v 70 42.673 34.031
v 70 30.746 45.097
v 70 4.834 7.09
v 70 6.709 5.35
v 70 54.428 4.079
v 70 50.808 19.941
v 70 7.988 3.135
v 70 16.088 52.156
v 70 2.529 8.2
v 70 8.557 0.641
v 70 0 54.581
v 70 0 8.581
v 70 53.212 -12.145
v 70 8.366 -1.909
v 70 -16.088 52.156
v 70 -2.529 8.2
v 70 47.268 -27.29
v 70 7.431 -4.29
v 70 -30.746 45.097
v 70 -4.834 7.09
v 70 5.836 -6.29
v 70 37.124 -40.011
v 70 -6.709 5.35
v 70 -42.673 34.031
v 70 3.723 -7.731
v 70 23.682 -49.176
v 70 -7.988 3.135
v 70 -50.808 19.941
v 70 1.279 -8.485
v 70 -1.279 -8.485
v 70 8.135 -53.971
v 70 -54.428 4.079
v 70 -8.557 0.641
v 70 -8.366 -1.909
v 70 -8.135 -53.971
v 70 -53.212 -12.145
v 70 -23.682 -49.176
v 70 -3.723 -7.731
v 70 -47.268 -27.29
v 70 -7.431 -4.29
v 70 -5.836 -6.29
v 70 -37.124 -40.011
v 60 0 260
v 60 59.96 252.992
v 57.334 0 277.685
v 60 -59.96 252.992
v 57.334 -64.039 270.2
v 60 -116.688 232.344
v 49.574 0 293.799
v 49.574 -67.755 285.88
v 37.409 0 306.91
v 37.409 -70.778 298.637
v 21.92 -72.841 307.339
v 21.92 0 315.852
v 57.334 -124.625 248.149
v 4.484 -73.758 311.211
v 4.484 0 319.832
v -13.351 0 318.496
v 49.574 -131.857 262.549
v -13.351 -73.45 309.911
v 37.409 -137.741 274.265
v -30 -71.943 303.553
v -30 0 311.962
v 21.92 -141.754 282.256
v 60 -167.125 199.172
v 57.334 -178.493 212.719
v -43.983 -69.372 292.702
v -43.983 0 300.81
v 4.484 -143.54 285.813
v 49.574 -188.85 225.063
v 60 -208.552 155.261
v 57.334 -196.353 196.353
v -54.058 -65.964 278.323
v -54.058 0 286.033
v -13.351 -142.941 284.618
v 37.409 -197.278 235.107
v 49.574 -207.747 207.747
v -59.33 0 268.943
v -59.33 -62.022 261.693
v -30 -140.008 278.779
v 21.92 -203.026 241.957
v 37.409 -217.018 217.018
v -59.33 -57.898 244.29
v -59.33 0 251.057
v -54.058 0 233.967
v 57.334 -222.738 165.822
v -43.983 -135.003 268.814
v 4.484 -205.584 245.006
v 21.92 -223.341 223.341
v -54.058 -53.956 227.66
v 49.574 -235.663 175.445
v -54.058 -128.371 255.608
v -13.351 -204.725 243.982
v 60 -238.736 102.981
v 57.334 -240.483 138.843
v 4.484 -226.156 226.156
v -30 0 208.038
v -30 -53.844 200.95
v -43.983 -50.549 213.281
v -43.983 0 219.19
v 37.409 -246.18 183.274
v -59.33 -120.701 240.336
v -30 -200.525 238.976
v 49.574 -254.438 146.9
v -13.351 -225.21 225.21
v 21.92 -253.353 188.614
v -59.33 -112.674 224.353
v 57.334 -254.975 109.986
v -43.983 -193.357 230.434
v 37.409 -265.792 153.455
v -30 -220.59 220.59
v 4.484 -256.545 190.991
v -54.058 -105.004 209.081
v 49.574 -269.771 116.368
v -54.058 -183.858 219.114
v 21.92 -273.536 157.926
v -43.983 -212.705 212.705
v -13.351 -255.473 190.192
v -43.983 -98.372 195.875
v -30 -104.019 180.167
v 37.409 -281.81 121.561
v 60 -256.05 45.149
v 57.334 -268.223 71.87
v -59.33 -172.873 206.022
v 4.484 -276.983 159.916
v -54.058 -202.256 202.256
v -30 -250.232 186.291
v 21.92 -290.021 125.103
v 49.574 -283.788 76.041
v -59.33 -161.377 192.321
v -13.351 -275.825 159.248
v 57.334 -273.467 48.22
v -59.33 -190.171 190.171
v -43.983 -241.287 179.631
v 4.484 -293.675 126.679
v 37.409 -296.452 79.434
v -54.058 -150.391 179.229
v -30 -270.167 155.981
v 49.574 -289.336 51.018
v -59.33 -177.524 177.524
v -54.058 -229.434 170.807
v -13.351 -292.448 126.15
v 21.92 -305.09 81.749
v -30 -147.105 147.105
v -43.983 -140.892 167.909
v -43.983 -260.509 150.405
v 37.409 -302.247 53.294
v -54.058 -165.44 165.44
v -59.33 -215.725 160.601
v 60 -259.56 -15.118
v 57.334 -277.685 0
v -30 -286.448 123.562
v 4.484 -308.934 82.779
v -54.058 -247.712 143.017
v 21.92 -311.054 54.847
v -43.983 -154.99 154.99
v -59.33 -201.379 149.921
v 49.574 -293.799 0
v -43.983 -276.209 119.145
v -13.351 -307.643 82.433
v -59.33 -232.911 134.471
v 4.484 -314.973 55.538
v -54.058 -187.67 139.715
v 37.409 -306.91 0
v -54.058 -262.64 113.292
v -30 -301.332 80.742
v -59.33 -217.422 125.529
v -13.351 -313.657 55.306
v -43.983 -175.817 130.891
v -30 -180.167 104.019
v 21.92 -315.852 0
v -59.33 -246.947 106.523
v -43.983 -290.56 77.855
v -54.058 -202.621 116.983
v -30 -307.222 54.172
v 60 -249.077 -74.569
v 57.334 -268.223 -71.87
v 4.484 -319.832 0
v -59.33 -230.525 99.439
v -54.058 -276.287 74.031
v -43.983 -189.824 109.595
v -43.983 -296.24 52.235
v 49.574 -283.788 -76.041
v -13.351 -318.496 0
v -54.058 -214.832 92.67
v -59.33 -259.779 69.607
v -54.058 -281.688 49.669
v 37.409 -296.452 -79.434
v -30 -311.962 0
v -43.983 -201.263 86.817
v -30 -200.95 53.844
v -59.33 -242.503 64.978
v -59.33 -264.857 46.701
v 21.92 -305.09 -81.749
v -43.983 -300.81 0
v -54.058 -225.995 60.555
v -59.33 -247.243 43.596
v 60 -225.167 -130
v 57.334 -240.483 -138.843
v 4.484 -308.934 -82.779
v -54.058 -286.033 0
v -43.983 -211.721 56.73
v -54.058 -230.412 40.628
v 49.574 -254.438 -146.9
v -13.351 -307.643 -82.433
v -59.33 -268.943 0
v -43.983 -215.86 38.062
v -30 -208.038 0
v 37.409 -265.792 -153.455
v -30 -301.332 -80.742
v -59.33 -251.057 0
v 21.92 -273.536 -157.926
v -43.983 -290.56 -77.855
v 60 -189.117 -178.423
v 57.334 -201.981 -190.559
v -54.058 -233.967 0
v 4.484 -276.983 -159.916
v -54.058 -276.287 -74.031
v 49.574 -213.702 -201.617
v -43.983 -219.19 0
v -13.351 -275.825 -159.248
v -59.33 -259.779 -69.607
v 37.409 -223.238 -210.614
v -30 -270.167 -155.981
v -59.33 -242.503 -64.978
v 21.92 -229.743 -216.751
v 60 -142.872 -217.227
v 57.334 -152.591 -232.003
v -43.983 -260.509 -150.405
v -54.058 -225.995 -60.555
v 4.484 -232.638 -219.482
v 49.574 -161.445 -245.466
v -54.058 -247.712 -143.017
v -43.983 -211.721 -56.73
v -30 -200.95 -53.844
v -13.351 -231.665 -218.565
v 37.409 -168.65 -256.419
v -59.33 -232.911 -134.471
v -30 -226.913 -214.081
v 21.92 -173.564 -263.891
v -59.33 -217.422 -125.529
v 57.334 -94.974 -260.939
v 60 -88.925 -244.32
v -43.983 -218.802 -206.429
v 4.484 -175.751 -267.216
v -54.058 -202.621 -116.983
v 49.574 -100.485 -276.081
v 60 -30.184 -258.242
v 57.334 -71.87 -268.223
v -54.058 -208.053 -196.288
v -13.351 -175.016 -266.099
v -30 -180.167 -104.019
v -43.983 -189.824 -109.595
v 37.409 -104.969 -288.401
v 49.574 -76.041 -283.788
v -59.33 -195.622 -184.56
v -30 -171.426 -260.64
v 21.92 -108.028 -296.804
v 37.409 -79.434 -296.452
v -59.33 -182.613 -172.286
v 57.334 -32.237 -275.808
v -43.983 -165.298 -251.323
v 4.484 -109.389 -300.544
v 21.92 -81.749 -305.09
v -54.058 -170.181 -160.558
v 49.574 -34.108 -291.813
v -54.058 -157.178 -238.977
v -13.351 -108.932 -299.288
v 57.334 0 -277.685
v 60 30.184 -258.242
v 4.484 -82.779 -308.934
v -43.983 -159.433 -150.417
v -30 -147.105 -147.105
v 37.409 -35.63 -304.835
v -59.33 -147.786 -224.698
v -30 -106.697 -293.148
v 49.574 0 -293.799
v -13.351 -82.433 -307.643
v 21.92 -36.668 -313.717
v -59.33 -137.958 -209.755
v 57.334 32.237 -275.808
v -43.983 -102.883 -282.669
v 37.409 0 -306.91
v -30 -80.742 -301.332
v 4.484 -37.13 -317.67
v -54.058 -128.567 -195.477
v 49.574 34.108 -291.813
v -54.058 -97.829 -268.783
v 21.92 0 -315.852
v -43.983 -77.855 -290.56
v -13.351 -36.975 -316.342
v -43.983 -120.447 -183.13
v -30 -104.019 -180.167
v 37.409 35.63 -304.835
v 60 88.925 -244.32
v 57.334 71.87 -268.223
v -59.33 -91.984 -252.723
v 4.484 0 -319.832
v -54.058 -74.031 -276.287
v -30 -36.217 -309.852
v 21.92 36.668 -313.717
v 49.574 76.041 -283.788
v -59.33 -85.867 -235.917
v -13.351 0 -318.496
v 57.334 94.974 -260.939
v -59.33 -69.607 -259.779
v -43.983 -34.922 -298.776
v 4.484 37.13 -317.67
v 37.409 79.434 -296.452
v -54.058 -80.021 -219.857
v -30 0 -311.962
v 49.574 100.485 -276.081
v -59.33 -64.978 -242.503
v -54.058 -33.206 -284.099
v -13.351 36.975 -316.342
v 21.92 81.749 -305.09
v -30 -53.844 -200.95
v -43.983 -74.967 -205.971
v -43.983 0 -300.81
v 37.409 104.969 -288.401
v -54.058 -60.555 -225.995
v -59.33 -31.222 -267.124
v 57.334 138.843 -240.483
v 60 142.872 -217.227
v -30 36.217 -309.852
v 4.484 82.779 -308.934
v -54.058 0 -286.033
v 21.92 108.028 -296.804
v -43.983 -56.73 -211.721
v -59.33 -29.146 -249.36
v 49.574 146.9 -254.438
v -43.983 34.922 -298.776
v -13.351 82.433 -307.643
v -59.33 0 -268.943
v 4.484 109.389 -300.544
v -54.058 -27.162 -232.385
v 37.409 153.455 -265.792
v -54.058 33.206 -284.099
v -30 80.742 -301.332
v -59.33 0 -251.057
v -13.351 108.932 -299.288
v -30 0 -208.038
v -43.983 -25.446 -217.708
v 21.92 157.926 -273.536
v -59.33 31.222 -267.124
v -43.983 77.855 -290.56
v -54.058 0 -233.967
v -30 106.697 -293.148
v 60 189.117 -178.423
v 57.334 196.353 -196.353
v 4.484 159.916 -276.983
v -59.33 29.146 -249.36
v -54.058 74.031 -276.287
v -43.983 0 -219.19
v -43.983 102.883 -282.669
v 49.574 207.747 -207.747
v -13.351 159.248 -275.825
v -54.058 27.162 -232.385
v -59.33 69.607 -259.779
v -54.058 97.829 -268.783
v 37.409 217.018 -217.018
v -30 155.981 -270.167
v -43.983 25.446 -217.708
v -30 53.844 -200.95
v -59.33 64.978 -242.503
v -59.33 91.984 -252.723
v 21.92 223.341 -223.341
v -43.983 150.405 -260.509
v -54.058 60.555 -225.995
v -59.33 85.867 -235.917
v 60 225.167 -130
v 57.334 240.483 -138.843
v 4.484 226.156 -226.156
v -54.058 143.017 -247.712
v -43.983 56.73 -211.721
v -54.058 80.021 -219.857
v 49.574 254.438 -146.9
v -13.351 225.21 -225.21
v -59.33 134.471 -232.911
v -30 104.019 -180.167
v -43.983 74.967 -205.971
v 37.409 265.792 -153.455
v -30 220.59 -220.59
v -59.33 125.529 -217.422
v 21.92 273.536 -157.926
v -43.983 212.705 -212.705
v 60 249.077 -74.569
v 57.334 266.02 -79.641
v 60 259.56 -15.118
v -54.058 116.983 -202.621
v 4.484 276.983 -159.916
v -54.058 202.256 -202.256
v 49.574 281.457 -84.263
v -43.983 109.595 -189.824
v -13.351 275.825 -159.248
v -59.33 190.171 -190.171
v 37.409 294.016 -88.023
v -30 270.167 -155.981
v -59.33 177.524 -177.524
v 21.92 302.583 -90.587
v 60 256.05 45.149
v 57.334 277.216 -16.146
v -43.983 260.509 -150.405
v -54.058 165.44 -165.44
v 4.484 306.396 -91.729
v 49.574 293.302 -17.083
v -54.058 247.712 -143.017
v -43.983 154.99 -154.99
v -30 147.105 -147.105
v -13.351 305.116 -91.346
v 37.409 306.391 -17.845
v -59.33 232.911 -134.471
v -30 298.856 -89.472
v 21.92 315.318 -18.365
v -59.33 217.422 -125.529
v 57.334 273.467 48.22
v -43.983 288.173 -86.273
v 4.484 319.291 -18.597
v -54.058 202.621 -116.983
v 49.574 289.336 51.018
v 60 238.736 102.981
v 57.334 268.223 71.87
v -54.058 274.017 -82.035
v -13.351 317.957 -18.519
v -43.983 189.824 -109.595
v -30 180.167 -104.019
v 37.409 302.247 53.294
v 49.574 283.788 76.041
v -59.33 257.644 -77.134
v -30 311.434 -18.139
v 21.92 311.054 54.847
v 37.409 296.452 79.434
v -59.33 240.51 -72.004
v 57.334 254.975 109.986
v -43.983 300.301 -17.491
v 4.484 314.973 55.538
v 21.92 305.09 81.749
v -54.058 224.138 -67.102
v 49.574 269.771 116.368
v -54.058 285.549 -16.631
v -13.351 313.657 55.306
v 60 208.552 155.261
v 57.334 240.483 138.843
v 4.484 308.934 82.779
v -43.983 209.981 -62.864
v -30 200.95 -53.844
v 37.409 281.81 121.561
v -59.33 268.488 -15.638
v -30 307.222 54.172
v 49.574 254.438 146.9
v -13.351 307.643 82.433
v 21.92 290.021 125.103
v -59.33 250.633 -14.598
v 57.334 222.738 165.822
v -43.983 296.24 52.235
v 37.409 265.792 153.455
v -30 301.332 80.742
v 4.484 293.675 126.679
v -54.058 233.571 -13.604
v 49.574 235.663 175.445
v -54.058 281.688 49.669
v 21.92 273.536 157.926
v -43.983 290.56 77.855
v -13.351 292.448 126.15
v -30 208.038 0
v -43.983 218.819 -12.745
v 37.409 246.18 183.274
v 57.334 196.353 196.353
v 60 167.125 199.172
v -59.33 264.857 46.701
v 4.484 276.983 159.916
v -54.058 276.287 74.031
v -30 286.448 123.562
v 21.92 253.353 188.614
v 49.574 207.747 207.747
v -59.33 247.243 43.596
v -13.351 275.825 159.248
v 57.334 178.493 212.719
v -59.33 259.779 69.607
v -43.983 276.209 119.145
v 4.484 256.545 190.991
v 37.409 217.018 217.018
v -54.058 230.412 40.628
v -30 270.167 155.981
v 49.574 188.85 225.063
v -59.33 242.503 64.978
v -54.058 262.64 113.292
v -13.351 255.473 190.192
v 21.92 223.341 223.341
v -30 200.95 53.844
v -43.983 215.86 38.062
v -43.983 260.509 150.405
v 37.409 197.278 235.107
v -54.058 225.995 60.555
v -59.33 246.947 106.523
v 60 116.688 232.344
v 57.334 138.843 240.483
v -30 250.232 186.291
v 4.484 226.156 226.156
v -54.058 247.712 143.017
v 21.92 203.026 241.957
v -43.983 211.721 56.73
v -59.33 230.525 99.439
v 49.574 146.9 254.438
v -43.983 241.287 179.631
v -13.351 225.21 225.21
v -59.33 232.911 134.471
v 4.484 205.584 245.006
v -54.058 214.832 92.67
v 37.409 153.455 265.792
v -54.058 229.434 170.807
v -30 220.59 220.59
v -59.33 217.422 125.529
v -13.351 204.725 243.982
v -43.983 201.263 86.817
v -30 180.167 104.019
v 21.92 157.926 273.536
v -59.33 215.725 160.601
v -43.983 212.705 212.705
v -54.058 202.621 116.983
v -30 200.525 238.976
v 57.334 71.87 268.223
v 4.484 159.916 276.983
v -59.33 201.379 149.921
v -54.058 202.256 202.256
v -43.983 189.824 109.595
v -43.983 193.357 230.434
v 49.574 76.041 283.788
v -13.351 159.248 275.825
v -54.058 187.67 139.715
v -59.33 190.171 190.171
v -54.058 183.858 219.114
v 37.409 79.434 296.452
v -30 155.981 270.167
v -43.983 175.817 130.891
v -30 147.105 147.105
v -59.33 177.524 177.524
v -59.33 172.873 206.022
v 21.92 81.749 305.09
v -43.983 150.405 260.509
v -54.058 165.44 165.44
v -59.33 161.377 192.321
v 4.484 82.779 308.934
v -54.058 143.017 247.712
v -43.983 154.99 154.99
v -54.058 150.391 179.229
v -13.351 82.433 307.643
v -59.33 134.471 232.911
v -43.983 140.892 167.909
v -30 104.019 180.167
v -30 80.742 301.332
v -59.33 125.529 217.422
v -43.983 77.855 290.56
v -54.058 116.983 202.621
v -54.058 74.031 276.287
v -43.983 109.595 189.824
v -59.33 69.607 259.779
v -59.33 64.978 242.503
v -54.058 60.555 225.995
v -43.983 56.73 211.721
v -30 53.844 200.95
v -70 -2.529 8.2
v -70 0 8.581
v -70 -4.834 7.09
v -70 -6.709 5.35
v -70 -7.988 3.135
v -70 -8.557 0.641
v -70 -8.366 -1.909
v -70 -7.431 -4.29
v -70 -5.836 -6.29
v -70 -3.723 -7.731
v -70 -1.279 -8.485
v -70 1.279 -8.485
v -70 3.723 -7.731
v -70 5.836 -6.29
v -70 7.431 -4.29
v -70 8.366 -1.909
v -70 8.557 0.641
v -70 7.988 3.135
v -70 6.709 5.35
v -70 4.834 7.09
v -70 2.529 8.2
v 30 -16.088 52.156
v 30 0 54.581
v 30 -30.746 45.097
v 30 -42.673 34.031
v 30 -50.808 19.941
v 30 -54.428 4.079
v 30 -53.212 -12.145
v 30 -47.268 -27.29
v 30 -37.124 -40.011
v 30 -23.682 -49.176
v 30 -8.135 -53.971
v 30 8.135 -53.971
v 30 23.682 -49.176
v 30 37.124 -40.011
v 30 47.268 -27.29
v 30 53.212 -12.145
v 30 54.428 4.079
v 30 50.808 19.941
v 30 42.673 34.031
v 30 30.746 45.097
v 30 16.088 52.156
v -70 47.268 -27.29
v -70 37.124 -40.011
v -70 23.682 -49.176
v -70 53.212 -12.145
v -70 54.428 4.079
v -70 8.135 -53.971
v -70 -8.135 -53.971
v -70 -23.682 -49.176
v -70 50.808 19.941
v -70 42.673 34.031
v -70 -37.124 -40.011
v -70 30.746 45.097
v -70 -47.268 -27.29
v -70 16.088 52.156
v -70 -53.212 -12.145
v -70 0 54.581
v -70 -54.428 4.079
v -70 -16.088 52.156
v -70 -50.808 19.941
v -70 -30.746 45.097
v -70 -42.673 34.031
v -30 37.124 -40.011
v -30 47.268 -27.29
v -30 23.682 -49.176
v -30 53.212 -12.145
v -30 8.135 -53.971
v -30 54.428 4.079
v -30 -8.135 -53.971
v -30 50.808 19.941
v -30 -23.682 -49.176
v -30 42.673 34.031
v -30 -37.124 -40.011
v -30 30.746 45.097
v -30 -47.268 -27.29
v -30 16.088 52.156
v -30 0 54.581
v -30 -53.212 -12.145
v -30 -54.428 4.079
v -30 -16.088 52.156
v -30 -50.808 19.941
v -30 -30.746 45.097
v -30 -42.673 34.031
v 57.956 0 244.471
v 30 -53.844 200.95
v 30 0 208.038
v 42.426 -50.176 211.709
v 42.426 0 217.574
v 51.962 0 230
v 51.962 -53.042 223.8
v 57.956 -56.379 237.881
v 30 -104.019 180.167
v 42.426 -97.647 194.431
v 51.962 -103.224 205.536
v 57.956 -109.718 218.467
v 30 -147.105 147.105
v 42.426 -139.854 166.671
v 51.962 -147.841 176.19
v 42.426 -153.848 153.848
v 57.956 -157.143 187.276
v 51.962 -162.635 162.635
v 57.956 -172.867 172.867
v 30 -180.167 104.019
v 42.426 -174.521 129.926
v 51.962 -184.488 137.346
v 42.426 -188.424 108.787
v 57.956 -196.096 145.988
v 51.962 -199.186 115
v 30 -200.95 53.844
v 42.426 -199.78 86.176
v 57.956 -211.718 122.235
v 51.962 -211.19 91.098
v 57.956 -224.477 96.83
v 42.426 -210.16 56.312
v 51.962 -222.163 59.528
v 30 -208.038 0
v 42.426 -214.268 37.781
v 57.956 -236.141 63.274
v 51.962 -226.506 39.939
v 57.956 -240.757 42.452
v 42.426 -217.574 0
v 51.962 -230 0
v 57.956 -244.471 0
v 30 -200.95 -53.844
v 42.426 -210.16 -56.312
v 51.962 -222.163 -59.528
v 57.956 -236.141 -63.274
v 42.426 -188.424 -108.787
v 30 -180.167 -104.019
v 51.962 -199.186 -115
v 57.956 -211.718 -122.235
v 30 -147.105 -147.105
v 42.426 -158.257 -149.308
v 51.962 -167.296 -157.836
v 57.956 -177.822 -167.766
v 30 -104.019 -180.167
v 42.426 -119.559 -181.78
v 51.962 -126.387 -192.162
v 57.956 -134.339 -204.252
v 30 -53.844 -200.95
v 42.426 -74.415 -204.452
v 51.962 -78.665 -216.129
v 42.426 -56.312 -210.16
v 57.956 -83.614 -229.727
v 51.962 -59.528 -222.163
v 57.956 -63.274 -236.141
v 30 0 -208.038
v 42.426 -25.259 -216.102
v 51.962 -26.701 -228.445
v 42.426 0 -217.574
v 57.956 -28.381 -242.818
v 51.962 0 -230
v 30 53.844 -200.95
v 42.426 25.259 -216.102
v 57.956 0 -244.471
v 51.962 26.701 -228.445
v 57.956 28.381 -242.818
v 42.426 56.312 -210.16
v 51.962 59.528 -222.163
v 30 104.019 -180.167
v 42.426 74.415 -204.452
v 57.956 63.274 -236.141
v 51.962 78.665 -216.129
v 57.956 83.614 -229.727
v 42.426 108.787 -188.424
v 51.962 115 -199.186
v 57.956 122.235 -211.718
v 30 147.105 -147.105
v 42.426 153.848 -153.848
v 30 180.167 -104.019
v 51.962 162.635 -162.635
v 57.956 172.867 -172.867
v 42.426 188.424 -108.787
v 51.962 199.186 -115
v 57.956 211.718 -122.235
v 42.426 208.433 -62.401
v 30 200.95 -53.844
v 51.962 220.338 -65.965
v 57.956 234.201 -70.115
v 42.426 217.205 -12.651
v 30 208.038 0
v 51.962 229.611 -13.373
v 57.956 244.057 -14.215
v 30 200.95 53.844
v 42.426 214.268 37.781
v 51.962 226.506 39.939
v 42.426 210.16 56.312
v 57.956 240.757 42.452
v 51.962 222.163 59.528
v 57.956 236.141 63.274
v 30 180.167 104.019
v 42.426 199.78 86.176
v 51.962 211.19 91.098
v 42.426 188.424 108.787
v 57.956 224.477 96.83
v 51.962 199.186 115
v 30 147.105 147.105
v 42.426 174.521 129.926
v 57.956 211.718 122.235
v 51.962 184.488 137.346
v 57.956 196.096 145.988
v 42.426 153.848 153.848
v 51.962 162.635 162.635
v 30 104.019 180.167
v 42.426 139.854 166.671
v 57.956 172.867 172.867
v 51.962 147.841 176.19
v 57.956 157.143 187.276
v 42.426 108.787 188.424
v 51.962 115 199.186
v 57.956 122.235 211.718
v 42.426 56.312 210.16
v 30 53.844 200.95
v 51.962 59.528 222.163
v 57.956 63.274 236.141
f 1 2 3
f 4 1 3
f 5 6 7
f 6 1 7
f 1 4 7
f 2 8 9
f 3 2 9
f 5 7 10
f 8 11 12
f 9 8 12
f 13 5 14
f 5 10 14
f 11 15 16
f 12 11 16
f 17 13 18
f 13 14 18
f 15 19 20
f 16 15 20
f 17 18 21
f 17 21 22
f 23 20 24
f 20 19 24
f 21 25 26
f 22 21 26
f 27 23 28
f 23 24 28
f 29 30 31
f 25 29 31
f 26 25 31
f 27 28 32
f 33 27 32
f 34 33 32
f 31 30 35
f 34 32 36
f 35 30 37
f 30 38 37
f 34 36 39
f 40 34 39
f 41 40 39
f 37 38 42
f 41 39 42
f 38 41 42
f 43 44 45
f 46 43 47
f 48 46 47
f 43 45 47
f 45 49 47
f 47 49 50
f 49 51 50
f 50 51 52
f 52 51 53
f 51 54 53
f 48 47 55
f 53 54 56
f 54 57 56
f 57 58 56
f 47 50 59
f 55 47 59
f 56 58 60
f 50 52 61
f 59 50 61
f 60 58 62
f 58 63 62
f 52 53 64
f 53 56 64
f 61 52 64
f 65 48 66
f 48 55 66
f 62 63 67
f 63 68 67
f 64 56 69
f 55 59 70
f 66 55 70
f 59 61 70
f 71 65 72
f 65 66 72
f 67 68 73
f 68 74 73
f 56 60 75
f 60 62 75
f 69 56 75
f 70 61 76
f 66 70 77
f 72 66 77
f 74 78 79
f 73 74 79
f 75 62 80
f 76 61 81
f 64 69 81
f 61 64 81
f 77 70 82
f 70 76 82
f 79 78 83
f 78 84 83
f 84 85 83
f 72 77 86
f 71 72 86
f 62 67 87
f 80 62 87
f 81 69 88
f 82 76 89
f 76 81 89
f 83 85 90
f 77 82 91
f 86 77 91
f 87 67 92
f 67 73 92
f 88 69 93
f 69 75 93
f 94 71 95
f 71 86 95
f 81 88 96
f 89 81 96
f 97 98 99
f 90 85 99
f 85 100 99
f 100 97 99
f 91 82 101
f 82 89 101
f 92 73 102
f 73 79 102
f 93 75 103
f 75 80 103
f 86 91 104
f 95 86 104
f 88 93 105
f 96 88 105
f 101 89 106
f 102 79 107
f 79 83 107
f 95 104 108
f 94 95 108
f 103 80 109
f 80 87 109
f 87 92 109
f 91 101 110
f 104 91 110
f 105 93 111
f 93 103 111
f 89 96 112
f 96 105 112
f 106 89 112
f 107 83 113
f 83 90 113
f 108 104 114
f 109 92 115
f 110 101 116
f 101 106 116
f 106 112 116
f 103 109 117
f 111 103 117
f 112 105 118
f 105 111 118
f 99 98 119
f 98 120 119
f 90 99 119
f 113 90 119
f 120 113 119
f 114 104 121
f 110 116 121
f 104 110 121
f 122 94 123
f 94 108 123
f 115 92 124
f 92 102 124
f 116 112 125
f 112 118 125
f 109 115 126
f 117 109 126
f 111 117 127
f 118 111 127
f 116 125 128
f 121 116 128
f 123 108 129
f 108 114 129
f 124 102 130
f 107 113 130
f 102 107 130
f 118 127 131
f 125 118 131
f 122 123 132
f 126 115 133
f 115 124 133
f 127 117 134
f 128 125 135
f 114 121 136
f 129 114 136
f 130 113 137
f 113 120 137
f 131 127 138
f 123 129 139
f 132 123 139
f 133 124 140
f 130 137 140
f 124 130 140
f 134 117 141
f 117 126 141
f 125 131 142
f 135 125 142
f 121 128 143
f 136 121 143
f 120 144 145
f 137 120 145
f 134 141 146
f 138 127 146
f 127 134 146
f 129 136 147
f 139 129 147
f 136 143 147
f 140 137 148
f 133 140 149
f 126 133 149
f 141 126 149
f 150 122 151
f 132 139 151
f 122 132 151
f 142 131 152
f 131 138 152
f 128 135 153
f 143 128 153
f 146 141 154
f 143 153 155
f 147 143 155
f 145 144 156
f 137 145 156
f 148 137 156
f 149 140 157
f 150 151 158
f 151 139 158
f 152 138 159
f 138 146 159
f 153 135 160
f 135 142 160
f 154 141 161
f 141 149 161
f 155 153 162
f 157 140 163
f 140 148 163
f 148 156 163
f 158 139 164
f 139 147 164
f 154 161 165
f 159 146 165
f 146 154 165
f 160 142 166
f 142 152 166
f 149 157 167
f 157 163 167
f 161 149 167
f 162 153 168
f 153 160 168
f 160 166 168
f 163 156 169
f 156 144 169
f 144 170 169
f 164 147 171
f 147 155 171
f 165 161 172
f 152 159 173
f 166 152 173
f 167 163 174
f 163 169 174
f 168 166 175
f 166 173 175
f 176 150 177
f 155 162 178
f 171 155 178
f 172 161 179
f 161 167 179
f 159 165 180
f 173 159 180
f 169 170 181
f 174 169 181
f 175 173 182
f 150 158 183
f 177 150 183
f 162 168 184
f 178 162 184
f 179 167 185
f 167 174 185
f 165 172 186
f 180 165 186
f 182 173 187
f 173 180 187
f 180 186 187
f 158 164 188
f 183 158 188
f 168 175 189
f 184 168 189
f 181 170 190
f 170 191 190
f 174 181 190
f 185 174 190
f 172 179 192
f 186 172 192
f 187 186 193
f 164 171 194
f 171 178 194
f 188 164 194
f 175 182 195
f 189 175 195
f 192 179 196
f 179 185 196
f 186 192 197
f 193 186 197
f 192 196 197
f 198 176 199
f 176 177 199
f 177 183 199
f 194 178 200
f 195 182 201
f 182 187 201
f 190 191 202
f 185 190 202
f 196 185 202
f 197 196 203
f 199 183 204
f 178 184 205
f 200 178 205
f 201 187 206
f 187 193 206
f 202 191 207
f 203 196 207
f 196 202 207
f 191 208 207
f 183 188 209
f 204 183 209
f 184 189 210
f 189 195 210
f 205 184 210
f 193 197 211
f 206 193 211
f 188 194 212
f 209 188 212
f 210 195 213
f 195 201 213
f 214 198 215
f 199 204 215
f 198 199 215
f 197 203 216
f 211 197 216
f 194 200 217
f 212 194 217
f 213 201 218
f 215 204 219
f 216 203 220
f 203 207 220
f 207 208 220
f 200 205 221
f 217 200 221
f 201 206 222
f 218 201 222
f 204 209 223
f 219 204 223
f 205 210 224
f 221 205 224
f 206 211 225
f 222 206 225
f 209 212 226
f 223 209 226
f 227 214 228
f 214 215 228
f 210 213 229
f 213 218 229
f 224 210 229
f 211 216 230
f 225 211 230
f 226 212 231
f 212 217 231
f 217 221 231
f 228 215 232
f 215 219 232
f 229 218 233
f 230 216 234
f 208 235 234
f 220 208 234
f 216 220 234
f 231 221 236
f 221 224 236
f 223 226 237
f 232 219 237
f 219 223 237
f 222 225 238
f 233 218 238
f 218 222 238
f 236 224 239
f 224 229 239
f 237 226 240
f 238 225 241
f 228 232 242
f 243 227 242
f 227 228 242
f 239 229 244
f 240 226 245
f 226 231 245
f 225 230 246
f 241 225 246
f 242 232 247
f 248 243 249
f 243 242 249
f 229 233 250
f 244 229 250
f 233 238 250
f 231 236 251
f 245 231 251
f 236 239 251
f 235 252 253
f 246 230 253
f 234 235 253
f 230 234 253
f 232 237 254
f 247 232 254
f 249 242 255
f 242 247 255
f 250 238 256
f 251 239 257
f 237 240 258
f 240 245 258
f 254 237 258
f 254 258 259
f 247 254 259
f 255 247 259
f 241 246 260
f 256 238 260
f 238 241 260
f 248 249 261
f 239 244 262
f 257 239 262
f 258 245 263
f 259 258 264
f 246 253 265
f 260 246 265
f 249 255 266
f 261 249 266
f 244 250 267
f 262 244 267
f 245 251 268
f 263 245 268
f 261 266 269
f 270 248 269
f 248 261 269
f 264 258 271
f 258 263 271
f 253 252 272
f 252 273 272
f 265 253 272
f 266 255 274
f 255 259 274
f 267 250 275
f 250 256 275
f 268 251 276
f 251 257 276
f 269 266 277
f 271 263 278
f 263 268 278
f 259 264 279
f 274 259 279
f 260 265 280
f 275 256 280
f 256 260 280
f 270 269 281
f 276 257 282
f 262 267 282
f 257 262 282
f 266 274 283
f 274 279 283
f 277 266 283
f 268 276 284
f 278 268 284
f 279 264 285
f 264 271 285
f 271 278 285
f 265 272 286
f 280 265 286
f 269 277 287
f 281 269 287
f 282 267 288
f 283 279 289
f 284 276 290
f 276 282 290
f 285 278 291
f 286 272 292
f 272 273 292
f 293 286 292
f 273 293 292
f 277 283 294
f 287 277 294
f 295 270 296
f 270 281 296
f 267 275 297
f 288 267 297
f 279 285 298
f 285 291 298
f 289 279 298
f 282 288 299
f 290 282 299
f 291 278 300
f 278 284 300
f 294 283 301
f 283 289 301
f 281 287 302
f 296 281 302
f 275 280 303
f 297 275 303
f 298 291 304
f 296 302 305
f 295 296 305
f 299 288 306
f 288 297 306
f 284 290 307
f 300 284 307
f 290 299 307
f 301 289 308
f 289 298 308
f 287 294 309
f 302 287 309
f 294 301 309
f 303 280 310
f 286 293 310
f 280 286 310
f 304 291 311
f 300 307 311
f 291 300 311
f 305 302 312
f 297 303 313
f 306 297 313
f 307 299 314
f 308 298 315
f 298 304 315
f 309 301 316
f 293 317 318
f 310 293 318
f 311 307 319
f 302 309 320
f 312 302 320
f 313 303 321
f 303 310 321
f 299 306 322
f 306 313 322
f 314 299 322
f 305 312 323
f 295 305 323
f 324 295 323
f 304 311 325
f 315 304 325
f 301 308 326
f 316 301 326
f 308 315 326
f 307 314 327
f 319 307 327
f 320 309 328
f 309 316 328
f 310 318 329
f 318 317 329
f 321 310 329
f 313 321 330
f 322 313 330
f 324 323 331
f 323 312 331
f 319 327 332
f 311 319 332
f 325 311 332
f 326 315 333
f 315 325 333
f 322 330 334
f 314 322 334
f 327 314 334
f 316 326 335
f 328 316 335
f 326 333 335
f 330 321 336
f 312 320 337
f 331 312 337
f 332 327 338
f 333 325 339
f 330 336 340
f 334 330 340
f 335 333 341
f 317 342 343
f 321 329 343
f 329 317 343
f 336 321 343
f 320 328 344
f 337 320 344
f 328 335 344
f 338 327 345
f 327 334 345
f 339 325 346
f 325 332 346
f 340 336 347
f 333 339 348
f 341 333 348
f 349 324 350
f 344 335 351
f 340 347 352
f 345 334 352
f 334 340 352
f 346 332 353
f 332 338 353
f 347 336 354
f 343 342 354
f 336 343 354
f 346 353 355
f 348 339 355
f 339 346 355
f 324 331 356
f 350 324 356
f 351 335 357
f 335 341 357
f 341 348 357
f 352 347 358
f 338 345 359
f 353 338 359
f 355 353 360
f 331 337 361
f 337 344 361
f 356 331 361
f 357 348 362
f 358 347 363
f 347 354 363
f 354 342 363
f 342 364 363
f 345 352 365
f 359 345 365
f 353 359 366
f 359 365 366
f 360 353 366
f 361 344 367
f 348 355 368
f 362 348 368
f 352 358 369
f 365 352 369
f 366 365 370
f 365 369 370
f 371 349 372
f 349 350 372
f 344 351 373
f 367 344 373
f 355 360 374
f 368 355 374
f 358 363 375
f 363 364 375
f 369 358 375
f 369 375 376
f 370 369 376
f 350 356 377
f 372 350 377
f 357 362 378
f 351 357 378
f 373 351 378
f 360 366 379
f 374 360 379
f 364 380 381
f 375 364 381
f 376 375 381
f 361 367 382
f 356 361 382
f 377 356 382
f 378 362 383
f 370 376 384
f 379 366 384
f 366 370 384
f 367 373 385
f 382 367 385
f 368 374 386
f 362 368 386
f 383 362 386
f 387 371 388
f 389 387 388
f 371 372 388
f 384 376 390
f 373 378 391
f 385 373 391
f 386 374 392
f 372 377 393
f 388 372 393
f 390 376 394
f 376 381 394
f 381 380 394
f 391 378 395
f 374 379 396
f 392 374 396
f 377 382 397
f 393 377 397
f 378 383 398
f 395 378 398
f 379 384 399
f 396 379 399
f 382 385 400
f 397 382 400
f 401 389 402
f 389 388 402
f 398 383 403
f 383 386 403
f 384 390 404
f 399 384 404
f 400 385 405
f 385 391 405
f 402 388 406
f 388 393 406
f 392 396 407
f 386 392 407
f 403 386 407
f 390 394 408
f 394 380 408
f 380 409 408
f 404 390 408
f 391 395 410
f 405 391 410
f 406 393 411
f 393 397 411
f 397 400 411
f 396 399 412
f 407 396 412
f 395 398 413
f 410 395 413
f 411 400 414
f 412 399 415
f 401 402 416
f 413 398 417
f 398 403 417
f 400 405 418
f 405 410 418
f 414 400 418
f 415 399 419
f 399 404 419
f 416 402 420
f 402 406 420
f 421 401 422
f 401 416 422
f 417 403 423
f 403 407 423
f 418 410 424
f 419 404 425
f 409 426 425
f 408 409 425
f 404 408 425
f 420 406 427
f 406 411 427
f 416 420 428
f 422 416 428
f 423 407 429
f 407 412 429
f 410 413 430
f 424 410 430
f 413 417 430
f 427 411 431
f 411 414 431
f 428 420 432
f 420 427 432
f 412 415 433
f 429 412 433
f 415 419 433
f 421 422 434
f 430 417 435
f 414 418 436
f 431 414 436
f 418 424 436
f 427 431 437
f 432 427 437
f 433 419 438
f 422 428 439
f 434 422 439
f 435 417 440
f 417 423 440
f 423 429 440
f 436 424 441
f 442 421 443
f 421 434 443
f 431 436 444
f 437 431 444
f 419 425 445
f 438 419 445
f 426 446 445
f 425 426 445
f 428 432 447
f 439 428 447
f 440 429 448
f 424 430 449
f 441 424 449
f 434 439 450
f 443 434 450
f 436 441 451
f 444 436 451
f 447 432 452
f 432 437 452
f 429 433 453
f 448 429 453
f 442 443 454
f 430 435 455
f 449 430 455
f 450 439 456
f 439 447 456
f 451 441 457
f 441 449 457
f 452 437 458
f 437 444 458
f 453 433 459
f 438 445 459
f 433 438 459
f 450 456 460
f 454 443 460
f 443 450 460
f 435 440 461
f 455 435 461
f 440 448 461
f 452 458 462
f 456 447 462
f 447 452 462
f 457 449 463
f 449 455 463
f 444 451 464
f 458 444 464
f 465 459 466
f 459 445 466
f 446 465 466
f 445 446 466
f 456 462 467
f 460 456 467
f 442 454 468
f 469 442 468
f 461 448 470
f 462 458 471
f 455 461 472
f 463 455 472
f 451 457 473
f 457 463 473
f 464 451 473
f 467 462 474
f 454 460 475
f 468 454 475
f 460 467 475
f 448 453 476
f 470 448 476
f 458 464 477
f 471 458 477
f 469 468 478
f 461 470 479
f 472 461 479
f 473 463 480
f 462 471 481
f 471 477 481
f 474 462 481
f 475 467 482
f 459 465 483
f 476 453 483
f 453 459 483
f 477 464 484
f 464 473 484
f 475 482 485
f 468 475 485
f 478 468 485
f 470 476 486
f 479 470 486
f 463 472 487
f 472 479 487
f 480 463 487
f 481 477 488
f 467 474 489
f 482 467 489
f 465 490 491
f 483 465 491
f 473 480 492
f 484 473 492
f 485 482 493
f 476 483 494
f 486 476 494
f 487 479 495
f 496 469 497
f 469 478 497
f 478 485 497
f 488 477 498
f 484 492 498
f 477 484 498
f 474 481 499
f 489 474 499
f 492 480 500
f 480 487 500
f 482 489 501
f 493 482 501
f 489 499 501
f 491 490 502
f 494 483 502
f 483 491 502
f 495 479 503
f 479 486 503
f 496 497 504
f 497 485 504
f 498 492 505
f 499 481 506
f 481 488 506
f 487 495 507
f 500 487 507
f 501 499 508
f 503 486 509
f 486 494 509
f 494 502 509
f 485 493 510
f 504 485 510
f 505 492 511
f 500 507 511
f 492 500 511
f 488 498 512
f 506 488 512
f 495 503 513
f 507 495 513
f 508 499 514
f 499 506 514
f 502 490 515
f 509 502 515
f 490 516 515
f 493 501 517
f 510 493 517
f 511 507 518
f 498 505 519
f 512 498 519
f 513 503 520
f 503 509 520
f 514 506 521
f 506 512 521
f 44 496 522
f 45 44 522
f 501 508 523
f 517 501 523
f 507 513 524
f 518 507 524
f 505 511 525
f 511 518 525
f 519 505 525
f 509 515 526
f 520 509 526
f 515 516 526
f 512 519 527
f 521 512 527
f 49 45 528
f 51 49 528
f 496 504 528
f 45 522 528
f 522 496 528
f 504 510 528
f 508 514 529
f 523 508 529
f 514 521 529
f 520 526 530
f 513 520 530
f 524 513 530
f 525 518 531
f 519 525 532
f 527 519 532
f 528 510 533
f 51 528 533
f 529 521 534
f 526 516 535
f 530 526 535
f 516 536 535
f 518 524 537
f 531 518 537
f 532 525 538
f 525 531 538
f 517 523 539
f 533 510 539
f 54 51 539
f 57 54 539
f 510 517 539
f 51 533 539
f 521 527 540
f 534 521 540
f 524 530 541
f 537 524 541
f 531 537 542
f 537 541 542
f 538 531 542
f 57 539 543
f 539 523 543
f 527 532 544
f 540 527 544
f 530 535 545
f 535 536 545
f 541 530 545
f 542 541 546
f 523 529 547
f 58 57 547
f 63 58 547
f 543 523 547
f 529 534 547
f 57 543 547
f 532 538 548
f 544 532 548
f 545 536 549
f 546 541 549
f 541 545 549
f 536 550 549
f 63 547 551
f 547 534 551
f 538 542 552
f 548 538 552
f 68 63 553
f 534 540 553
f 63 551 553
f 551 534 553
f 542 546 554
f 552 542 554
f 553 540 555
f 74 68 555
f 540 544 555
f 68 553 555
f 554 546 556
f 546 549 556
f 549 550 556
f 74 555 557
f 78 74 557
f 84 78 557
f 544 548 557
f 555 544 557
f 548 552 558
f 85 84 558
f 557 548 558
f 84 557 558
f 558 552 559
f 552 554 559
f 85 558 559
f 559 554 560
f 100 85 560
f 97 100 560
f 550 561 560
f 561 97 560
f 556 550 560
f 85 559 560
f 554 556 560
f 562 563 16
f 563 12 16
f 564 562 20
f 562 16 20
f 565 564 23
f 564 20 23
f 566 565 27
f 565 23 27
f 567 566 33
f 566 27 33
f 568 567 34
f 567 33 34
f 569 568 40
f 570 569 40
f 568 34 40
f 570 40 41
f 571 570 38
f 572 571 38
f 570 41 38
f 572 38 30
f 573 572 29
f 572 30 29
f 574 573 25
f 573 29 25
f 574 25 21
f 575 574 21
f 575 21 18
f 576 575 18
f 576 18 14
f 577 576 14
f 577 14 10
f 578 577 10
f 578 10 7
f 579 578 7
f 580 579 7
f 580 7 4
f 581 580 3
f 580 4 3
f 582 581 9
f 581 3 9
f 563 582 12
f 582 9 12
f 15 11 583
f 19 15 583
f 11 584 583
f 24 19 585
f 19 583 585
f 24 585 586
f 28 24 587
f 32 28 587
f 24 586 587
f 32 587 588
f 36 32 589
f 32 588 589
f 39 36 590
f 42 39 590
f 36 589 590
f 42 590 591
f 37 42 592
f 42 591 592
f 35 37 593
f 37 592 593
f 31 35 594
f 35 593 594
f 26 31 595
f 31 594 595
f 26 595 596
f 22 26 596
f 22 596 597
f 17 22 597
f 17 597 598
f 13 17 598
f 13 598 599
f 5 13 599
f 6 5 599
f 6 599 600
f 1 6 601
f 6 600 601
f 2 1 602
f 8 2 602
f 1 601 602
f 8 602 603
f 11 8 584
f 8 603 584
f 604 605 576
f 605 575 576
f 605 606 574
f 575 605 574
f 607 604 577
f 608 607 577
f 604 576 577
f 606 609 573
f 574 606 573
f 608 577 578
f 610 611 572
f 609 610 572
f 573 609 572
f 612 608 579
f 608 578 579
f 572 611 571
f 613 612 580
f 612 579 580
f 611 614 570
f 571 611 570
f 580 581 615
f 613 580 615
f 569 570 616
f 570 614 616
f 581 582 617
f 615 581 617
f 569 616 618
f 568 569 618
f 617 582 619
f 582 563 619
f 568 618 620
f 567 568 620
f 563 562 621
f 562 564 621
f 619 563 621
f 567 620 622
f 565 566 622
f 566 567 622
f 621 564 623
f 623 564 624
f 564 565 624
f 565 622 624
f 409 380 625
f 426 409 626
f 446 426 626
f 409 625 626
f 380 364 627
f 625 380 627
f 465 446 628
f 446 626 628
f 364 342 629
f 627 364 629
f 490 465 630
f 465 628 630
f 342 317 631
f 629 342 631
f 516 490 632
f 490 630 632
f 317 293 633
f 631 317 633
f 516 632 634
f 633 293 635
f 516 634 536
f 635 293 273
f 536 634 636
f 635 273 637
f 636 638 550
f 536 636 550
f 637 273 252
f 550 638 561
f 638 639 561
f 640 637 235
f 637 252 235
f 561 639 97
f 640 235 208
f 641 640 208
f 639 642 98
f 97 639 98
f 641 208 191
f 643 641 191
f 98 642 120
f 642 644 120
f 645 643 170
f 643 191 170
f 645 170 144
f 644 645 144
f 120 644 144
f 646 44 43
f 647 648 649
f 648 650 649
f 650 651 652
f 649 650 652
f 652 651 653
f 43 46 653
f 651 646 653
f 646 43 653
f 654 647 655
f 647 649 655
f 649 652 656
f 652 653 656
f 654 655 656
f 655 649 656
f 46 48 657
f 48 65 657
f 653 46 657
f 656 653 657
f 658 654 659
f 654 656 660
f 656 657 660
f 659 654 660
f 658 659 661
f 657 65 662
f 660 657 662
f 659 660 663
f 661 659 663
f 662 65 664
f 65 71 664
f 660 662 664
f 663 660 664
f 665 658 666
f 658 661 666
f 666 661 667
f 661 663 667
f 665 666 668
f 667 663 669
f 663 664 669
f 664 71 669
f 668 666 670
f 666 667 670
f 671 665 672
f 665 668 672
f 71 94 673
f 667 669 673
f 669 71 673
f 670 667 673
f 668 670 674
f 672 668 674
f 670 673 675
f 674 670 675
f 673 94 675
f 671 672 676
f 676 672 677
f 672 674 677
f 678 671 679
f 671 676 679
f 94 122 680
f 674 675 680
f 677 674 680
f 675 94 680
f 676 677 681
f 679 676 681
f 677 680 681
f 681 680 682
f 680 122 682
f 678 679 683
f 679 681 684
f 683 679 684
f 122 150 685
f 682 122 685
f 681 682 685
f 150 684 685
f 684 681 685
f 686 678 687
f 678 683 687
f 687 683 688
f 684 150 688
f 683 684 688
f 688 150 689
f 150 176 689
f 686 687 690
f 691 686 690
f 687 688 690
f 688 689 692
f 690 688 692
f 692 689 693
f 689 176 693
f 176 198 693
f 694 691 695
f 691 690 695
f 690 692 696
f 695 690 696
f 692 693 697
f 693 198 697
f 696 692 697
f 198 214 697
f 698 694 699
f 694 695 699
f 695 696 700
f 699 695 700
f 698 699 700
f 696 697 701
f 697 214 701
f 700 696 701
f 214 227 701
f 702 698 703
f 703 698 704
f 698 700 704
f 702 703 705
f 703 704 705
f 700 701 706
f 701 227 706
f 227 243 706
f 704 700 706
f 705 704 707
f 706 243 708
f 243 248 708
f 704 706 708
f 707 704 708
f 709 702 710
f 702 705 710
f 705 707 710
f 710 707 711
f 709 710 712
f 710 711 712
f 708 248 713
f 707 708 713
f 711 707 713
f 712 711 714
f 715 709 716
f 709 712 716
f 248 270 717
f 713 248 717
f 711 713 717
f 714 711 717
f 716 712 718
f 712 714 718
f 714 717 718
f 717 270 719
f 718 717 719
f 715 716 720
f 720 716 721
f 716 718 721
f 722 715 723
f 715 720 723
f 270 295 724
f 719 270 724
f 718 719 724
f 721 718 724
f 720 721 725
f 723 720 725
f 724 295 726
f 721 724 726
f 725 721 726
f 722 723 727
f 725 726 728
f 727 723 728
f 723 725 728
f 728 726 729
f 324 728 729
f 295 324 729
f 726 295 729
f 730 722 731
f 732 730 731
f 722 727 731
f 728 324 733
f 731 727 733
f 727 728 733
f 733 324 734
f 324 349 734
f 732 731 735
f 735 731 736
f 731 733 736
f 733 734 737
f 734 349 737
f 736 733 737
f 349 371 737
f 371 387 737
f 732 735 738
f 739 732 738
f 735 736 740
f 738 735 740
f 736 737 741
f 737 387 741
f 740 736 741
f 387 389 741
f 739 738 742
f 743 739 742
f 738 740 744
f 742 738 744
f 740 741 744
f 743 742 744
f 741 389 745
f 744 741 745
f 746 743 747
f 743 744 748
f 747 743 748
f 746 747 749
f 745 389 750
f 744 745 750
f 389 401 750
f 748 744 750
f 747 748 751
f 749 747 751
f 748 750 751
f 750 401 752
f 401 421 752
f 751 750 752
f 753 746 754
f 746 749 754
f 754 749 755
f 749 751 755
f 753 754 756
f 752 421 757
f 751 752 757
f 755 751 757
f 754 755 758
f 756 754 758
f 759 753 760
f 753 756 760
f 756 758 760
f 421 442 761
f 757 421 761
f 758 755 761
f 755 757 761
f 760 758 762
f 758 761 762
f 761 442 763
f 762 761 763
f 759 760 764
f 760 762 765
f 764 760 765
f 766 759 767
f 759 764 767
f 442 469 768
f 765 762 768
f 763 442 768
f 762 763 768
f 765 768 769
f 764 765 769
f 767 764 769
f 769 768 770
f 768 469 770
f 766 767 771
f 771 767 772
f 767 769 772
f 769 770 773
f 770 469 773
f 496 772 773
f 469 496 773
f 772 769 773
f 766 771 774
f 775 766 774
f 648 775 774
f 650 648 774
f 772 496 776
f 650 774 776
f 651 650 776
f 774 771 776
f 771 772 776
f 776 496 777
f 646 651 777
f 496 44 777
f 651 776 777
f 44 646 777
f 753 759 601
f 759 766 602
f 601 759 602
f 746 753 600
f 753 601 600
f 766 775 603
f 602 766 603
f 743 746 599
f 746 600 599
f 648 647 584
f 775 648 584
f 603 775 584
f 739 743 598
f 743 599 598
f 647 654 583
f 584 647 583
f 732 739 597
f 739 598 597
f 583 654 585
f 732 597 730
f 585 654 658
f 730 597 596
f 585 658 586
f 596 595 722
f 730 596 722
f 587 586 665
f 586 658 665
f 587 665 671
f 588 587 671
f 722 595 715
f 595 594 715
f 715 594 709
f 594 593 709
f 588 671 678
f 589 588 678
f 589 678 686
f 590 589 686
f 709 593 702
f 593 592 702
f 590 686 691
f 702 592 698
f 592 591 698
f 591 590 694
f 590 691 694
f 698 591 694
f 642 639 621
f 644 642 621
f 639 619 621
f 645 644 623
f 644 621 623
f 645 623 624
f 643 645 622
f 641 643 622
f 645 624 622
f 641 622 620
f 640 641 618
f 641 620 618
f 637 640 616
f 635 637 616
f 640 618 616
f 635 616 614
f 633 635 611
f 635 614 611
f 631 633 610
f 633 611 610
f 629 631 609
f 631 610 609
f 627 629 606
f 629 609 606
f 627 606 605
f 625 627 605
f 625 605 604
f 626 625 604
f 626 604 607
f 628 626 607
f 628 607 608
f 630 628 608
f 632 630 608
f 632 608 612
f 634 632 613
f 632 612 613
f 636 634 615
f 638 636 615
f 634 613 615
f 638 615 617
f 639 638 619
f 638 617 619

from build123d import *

# Parameters (mm, degrees)
F3_DEPTH = 25


with BuildPart() as f1:
    # F0 (on Front) → F1 (revolve)
    with BuildSketch(Plane.XZ):
        with BuildLine():
            Line((-70, 54.58075), (-70, 8.58075))
            Line((-70, 8.58075), (70, 8.58075))
            Line((70, 8.58075), (70, 54.58075))
            Line((70, 54.58075), (30, 54.58075))
            Line((30, 54.58075), (30, 208.038476))
            ThreePointArc((30, 208.038476), (0, 200), (-30, 208.038476))
            Line((-30, 208.038476), (-30, 54.58075))
            Line((-30, 54.58075), (-70, 54.58075))
        make_face()
        with BuildLine():
            ThreePointArc((60, 260), (-30, 311.961524), (-30, 208.038476))
            ThreePointArc((-30, 208.038476), (0, 200), (30, 208.038476))
            ThreePointArc((30, 208.038476), (51.961524, 230), (60, 260))
        make_face()
    revolve(axis=Axis((0, 0, 0), (1, 0, 0)))

    # F2 (on face) → F3 (join)
    with BuildSketch(Plane(origin=(-30, 0, 0), x_dir=(0, -1, 0), z_dir=(-1, 0, 0))):
        with BuildLine():
            ThreePointArc((-55.462766, 188.029161), (-61.774314, 182.493227), (-61.643278, 174.098882))
            Line((-61.643278, 174.098882), (-12.55207, 72.159939))
            ThreePointArc((-12.55207, 72.159939), (-8.665392, 67.910717), (-3.079813, 66.509481))
            ThreePointArc((-3.079813, 66.509481), (0, 66.58075), (3.079813, 66.509481))
            ThreePointArc((3.079813, 66.509481), (8.665392, 67.910717), (12.55207, 72.159939))
            Line((12.55207, 72.159939), (61.643278, 174.098882))
            ThreePointArc((61.643278, 174.098882), (61.774314, 182.493227), (55.462766, 188.029161))
            ThreePointArc((55.462766, 188.029161), (0, 196.038476), (-55.462766, 188.029161))
        make_face()
    extrude(amount=-F3_DEPTH)


solid = f1.part
